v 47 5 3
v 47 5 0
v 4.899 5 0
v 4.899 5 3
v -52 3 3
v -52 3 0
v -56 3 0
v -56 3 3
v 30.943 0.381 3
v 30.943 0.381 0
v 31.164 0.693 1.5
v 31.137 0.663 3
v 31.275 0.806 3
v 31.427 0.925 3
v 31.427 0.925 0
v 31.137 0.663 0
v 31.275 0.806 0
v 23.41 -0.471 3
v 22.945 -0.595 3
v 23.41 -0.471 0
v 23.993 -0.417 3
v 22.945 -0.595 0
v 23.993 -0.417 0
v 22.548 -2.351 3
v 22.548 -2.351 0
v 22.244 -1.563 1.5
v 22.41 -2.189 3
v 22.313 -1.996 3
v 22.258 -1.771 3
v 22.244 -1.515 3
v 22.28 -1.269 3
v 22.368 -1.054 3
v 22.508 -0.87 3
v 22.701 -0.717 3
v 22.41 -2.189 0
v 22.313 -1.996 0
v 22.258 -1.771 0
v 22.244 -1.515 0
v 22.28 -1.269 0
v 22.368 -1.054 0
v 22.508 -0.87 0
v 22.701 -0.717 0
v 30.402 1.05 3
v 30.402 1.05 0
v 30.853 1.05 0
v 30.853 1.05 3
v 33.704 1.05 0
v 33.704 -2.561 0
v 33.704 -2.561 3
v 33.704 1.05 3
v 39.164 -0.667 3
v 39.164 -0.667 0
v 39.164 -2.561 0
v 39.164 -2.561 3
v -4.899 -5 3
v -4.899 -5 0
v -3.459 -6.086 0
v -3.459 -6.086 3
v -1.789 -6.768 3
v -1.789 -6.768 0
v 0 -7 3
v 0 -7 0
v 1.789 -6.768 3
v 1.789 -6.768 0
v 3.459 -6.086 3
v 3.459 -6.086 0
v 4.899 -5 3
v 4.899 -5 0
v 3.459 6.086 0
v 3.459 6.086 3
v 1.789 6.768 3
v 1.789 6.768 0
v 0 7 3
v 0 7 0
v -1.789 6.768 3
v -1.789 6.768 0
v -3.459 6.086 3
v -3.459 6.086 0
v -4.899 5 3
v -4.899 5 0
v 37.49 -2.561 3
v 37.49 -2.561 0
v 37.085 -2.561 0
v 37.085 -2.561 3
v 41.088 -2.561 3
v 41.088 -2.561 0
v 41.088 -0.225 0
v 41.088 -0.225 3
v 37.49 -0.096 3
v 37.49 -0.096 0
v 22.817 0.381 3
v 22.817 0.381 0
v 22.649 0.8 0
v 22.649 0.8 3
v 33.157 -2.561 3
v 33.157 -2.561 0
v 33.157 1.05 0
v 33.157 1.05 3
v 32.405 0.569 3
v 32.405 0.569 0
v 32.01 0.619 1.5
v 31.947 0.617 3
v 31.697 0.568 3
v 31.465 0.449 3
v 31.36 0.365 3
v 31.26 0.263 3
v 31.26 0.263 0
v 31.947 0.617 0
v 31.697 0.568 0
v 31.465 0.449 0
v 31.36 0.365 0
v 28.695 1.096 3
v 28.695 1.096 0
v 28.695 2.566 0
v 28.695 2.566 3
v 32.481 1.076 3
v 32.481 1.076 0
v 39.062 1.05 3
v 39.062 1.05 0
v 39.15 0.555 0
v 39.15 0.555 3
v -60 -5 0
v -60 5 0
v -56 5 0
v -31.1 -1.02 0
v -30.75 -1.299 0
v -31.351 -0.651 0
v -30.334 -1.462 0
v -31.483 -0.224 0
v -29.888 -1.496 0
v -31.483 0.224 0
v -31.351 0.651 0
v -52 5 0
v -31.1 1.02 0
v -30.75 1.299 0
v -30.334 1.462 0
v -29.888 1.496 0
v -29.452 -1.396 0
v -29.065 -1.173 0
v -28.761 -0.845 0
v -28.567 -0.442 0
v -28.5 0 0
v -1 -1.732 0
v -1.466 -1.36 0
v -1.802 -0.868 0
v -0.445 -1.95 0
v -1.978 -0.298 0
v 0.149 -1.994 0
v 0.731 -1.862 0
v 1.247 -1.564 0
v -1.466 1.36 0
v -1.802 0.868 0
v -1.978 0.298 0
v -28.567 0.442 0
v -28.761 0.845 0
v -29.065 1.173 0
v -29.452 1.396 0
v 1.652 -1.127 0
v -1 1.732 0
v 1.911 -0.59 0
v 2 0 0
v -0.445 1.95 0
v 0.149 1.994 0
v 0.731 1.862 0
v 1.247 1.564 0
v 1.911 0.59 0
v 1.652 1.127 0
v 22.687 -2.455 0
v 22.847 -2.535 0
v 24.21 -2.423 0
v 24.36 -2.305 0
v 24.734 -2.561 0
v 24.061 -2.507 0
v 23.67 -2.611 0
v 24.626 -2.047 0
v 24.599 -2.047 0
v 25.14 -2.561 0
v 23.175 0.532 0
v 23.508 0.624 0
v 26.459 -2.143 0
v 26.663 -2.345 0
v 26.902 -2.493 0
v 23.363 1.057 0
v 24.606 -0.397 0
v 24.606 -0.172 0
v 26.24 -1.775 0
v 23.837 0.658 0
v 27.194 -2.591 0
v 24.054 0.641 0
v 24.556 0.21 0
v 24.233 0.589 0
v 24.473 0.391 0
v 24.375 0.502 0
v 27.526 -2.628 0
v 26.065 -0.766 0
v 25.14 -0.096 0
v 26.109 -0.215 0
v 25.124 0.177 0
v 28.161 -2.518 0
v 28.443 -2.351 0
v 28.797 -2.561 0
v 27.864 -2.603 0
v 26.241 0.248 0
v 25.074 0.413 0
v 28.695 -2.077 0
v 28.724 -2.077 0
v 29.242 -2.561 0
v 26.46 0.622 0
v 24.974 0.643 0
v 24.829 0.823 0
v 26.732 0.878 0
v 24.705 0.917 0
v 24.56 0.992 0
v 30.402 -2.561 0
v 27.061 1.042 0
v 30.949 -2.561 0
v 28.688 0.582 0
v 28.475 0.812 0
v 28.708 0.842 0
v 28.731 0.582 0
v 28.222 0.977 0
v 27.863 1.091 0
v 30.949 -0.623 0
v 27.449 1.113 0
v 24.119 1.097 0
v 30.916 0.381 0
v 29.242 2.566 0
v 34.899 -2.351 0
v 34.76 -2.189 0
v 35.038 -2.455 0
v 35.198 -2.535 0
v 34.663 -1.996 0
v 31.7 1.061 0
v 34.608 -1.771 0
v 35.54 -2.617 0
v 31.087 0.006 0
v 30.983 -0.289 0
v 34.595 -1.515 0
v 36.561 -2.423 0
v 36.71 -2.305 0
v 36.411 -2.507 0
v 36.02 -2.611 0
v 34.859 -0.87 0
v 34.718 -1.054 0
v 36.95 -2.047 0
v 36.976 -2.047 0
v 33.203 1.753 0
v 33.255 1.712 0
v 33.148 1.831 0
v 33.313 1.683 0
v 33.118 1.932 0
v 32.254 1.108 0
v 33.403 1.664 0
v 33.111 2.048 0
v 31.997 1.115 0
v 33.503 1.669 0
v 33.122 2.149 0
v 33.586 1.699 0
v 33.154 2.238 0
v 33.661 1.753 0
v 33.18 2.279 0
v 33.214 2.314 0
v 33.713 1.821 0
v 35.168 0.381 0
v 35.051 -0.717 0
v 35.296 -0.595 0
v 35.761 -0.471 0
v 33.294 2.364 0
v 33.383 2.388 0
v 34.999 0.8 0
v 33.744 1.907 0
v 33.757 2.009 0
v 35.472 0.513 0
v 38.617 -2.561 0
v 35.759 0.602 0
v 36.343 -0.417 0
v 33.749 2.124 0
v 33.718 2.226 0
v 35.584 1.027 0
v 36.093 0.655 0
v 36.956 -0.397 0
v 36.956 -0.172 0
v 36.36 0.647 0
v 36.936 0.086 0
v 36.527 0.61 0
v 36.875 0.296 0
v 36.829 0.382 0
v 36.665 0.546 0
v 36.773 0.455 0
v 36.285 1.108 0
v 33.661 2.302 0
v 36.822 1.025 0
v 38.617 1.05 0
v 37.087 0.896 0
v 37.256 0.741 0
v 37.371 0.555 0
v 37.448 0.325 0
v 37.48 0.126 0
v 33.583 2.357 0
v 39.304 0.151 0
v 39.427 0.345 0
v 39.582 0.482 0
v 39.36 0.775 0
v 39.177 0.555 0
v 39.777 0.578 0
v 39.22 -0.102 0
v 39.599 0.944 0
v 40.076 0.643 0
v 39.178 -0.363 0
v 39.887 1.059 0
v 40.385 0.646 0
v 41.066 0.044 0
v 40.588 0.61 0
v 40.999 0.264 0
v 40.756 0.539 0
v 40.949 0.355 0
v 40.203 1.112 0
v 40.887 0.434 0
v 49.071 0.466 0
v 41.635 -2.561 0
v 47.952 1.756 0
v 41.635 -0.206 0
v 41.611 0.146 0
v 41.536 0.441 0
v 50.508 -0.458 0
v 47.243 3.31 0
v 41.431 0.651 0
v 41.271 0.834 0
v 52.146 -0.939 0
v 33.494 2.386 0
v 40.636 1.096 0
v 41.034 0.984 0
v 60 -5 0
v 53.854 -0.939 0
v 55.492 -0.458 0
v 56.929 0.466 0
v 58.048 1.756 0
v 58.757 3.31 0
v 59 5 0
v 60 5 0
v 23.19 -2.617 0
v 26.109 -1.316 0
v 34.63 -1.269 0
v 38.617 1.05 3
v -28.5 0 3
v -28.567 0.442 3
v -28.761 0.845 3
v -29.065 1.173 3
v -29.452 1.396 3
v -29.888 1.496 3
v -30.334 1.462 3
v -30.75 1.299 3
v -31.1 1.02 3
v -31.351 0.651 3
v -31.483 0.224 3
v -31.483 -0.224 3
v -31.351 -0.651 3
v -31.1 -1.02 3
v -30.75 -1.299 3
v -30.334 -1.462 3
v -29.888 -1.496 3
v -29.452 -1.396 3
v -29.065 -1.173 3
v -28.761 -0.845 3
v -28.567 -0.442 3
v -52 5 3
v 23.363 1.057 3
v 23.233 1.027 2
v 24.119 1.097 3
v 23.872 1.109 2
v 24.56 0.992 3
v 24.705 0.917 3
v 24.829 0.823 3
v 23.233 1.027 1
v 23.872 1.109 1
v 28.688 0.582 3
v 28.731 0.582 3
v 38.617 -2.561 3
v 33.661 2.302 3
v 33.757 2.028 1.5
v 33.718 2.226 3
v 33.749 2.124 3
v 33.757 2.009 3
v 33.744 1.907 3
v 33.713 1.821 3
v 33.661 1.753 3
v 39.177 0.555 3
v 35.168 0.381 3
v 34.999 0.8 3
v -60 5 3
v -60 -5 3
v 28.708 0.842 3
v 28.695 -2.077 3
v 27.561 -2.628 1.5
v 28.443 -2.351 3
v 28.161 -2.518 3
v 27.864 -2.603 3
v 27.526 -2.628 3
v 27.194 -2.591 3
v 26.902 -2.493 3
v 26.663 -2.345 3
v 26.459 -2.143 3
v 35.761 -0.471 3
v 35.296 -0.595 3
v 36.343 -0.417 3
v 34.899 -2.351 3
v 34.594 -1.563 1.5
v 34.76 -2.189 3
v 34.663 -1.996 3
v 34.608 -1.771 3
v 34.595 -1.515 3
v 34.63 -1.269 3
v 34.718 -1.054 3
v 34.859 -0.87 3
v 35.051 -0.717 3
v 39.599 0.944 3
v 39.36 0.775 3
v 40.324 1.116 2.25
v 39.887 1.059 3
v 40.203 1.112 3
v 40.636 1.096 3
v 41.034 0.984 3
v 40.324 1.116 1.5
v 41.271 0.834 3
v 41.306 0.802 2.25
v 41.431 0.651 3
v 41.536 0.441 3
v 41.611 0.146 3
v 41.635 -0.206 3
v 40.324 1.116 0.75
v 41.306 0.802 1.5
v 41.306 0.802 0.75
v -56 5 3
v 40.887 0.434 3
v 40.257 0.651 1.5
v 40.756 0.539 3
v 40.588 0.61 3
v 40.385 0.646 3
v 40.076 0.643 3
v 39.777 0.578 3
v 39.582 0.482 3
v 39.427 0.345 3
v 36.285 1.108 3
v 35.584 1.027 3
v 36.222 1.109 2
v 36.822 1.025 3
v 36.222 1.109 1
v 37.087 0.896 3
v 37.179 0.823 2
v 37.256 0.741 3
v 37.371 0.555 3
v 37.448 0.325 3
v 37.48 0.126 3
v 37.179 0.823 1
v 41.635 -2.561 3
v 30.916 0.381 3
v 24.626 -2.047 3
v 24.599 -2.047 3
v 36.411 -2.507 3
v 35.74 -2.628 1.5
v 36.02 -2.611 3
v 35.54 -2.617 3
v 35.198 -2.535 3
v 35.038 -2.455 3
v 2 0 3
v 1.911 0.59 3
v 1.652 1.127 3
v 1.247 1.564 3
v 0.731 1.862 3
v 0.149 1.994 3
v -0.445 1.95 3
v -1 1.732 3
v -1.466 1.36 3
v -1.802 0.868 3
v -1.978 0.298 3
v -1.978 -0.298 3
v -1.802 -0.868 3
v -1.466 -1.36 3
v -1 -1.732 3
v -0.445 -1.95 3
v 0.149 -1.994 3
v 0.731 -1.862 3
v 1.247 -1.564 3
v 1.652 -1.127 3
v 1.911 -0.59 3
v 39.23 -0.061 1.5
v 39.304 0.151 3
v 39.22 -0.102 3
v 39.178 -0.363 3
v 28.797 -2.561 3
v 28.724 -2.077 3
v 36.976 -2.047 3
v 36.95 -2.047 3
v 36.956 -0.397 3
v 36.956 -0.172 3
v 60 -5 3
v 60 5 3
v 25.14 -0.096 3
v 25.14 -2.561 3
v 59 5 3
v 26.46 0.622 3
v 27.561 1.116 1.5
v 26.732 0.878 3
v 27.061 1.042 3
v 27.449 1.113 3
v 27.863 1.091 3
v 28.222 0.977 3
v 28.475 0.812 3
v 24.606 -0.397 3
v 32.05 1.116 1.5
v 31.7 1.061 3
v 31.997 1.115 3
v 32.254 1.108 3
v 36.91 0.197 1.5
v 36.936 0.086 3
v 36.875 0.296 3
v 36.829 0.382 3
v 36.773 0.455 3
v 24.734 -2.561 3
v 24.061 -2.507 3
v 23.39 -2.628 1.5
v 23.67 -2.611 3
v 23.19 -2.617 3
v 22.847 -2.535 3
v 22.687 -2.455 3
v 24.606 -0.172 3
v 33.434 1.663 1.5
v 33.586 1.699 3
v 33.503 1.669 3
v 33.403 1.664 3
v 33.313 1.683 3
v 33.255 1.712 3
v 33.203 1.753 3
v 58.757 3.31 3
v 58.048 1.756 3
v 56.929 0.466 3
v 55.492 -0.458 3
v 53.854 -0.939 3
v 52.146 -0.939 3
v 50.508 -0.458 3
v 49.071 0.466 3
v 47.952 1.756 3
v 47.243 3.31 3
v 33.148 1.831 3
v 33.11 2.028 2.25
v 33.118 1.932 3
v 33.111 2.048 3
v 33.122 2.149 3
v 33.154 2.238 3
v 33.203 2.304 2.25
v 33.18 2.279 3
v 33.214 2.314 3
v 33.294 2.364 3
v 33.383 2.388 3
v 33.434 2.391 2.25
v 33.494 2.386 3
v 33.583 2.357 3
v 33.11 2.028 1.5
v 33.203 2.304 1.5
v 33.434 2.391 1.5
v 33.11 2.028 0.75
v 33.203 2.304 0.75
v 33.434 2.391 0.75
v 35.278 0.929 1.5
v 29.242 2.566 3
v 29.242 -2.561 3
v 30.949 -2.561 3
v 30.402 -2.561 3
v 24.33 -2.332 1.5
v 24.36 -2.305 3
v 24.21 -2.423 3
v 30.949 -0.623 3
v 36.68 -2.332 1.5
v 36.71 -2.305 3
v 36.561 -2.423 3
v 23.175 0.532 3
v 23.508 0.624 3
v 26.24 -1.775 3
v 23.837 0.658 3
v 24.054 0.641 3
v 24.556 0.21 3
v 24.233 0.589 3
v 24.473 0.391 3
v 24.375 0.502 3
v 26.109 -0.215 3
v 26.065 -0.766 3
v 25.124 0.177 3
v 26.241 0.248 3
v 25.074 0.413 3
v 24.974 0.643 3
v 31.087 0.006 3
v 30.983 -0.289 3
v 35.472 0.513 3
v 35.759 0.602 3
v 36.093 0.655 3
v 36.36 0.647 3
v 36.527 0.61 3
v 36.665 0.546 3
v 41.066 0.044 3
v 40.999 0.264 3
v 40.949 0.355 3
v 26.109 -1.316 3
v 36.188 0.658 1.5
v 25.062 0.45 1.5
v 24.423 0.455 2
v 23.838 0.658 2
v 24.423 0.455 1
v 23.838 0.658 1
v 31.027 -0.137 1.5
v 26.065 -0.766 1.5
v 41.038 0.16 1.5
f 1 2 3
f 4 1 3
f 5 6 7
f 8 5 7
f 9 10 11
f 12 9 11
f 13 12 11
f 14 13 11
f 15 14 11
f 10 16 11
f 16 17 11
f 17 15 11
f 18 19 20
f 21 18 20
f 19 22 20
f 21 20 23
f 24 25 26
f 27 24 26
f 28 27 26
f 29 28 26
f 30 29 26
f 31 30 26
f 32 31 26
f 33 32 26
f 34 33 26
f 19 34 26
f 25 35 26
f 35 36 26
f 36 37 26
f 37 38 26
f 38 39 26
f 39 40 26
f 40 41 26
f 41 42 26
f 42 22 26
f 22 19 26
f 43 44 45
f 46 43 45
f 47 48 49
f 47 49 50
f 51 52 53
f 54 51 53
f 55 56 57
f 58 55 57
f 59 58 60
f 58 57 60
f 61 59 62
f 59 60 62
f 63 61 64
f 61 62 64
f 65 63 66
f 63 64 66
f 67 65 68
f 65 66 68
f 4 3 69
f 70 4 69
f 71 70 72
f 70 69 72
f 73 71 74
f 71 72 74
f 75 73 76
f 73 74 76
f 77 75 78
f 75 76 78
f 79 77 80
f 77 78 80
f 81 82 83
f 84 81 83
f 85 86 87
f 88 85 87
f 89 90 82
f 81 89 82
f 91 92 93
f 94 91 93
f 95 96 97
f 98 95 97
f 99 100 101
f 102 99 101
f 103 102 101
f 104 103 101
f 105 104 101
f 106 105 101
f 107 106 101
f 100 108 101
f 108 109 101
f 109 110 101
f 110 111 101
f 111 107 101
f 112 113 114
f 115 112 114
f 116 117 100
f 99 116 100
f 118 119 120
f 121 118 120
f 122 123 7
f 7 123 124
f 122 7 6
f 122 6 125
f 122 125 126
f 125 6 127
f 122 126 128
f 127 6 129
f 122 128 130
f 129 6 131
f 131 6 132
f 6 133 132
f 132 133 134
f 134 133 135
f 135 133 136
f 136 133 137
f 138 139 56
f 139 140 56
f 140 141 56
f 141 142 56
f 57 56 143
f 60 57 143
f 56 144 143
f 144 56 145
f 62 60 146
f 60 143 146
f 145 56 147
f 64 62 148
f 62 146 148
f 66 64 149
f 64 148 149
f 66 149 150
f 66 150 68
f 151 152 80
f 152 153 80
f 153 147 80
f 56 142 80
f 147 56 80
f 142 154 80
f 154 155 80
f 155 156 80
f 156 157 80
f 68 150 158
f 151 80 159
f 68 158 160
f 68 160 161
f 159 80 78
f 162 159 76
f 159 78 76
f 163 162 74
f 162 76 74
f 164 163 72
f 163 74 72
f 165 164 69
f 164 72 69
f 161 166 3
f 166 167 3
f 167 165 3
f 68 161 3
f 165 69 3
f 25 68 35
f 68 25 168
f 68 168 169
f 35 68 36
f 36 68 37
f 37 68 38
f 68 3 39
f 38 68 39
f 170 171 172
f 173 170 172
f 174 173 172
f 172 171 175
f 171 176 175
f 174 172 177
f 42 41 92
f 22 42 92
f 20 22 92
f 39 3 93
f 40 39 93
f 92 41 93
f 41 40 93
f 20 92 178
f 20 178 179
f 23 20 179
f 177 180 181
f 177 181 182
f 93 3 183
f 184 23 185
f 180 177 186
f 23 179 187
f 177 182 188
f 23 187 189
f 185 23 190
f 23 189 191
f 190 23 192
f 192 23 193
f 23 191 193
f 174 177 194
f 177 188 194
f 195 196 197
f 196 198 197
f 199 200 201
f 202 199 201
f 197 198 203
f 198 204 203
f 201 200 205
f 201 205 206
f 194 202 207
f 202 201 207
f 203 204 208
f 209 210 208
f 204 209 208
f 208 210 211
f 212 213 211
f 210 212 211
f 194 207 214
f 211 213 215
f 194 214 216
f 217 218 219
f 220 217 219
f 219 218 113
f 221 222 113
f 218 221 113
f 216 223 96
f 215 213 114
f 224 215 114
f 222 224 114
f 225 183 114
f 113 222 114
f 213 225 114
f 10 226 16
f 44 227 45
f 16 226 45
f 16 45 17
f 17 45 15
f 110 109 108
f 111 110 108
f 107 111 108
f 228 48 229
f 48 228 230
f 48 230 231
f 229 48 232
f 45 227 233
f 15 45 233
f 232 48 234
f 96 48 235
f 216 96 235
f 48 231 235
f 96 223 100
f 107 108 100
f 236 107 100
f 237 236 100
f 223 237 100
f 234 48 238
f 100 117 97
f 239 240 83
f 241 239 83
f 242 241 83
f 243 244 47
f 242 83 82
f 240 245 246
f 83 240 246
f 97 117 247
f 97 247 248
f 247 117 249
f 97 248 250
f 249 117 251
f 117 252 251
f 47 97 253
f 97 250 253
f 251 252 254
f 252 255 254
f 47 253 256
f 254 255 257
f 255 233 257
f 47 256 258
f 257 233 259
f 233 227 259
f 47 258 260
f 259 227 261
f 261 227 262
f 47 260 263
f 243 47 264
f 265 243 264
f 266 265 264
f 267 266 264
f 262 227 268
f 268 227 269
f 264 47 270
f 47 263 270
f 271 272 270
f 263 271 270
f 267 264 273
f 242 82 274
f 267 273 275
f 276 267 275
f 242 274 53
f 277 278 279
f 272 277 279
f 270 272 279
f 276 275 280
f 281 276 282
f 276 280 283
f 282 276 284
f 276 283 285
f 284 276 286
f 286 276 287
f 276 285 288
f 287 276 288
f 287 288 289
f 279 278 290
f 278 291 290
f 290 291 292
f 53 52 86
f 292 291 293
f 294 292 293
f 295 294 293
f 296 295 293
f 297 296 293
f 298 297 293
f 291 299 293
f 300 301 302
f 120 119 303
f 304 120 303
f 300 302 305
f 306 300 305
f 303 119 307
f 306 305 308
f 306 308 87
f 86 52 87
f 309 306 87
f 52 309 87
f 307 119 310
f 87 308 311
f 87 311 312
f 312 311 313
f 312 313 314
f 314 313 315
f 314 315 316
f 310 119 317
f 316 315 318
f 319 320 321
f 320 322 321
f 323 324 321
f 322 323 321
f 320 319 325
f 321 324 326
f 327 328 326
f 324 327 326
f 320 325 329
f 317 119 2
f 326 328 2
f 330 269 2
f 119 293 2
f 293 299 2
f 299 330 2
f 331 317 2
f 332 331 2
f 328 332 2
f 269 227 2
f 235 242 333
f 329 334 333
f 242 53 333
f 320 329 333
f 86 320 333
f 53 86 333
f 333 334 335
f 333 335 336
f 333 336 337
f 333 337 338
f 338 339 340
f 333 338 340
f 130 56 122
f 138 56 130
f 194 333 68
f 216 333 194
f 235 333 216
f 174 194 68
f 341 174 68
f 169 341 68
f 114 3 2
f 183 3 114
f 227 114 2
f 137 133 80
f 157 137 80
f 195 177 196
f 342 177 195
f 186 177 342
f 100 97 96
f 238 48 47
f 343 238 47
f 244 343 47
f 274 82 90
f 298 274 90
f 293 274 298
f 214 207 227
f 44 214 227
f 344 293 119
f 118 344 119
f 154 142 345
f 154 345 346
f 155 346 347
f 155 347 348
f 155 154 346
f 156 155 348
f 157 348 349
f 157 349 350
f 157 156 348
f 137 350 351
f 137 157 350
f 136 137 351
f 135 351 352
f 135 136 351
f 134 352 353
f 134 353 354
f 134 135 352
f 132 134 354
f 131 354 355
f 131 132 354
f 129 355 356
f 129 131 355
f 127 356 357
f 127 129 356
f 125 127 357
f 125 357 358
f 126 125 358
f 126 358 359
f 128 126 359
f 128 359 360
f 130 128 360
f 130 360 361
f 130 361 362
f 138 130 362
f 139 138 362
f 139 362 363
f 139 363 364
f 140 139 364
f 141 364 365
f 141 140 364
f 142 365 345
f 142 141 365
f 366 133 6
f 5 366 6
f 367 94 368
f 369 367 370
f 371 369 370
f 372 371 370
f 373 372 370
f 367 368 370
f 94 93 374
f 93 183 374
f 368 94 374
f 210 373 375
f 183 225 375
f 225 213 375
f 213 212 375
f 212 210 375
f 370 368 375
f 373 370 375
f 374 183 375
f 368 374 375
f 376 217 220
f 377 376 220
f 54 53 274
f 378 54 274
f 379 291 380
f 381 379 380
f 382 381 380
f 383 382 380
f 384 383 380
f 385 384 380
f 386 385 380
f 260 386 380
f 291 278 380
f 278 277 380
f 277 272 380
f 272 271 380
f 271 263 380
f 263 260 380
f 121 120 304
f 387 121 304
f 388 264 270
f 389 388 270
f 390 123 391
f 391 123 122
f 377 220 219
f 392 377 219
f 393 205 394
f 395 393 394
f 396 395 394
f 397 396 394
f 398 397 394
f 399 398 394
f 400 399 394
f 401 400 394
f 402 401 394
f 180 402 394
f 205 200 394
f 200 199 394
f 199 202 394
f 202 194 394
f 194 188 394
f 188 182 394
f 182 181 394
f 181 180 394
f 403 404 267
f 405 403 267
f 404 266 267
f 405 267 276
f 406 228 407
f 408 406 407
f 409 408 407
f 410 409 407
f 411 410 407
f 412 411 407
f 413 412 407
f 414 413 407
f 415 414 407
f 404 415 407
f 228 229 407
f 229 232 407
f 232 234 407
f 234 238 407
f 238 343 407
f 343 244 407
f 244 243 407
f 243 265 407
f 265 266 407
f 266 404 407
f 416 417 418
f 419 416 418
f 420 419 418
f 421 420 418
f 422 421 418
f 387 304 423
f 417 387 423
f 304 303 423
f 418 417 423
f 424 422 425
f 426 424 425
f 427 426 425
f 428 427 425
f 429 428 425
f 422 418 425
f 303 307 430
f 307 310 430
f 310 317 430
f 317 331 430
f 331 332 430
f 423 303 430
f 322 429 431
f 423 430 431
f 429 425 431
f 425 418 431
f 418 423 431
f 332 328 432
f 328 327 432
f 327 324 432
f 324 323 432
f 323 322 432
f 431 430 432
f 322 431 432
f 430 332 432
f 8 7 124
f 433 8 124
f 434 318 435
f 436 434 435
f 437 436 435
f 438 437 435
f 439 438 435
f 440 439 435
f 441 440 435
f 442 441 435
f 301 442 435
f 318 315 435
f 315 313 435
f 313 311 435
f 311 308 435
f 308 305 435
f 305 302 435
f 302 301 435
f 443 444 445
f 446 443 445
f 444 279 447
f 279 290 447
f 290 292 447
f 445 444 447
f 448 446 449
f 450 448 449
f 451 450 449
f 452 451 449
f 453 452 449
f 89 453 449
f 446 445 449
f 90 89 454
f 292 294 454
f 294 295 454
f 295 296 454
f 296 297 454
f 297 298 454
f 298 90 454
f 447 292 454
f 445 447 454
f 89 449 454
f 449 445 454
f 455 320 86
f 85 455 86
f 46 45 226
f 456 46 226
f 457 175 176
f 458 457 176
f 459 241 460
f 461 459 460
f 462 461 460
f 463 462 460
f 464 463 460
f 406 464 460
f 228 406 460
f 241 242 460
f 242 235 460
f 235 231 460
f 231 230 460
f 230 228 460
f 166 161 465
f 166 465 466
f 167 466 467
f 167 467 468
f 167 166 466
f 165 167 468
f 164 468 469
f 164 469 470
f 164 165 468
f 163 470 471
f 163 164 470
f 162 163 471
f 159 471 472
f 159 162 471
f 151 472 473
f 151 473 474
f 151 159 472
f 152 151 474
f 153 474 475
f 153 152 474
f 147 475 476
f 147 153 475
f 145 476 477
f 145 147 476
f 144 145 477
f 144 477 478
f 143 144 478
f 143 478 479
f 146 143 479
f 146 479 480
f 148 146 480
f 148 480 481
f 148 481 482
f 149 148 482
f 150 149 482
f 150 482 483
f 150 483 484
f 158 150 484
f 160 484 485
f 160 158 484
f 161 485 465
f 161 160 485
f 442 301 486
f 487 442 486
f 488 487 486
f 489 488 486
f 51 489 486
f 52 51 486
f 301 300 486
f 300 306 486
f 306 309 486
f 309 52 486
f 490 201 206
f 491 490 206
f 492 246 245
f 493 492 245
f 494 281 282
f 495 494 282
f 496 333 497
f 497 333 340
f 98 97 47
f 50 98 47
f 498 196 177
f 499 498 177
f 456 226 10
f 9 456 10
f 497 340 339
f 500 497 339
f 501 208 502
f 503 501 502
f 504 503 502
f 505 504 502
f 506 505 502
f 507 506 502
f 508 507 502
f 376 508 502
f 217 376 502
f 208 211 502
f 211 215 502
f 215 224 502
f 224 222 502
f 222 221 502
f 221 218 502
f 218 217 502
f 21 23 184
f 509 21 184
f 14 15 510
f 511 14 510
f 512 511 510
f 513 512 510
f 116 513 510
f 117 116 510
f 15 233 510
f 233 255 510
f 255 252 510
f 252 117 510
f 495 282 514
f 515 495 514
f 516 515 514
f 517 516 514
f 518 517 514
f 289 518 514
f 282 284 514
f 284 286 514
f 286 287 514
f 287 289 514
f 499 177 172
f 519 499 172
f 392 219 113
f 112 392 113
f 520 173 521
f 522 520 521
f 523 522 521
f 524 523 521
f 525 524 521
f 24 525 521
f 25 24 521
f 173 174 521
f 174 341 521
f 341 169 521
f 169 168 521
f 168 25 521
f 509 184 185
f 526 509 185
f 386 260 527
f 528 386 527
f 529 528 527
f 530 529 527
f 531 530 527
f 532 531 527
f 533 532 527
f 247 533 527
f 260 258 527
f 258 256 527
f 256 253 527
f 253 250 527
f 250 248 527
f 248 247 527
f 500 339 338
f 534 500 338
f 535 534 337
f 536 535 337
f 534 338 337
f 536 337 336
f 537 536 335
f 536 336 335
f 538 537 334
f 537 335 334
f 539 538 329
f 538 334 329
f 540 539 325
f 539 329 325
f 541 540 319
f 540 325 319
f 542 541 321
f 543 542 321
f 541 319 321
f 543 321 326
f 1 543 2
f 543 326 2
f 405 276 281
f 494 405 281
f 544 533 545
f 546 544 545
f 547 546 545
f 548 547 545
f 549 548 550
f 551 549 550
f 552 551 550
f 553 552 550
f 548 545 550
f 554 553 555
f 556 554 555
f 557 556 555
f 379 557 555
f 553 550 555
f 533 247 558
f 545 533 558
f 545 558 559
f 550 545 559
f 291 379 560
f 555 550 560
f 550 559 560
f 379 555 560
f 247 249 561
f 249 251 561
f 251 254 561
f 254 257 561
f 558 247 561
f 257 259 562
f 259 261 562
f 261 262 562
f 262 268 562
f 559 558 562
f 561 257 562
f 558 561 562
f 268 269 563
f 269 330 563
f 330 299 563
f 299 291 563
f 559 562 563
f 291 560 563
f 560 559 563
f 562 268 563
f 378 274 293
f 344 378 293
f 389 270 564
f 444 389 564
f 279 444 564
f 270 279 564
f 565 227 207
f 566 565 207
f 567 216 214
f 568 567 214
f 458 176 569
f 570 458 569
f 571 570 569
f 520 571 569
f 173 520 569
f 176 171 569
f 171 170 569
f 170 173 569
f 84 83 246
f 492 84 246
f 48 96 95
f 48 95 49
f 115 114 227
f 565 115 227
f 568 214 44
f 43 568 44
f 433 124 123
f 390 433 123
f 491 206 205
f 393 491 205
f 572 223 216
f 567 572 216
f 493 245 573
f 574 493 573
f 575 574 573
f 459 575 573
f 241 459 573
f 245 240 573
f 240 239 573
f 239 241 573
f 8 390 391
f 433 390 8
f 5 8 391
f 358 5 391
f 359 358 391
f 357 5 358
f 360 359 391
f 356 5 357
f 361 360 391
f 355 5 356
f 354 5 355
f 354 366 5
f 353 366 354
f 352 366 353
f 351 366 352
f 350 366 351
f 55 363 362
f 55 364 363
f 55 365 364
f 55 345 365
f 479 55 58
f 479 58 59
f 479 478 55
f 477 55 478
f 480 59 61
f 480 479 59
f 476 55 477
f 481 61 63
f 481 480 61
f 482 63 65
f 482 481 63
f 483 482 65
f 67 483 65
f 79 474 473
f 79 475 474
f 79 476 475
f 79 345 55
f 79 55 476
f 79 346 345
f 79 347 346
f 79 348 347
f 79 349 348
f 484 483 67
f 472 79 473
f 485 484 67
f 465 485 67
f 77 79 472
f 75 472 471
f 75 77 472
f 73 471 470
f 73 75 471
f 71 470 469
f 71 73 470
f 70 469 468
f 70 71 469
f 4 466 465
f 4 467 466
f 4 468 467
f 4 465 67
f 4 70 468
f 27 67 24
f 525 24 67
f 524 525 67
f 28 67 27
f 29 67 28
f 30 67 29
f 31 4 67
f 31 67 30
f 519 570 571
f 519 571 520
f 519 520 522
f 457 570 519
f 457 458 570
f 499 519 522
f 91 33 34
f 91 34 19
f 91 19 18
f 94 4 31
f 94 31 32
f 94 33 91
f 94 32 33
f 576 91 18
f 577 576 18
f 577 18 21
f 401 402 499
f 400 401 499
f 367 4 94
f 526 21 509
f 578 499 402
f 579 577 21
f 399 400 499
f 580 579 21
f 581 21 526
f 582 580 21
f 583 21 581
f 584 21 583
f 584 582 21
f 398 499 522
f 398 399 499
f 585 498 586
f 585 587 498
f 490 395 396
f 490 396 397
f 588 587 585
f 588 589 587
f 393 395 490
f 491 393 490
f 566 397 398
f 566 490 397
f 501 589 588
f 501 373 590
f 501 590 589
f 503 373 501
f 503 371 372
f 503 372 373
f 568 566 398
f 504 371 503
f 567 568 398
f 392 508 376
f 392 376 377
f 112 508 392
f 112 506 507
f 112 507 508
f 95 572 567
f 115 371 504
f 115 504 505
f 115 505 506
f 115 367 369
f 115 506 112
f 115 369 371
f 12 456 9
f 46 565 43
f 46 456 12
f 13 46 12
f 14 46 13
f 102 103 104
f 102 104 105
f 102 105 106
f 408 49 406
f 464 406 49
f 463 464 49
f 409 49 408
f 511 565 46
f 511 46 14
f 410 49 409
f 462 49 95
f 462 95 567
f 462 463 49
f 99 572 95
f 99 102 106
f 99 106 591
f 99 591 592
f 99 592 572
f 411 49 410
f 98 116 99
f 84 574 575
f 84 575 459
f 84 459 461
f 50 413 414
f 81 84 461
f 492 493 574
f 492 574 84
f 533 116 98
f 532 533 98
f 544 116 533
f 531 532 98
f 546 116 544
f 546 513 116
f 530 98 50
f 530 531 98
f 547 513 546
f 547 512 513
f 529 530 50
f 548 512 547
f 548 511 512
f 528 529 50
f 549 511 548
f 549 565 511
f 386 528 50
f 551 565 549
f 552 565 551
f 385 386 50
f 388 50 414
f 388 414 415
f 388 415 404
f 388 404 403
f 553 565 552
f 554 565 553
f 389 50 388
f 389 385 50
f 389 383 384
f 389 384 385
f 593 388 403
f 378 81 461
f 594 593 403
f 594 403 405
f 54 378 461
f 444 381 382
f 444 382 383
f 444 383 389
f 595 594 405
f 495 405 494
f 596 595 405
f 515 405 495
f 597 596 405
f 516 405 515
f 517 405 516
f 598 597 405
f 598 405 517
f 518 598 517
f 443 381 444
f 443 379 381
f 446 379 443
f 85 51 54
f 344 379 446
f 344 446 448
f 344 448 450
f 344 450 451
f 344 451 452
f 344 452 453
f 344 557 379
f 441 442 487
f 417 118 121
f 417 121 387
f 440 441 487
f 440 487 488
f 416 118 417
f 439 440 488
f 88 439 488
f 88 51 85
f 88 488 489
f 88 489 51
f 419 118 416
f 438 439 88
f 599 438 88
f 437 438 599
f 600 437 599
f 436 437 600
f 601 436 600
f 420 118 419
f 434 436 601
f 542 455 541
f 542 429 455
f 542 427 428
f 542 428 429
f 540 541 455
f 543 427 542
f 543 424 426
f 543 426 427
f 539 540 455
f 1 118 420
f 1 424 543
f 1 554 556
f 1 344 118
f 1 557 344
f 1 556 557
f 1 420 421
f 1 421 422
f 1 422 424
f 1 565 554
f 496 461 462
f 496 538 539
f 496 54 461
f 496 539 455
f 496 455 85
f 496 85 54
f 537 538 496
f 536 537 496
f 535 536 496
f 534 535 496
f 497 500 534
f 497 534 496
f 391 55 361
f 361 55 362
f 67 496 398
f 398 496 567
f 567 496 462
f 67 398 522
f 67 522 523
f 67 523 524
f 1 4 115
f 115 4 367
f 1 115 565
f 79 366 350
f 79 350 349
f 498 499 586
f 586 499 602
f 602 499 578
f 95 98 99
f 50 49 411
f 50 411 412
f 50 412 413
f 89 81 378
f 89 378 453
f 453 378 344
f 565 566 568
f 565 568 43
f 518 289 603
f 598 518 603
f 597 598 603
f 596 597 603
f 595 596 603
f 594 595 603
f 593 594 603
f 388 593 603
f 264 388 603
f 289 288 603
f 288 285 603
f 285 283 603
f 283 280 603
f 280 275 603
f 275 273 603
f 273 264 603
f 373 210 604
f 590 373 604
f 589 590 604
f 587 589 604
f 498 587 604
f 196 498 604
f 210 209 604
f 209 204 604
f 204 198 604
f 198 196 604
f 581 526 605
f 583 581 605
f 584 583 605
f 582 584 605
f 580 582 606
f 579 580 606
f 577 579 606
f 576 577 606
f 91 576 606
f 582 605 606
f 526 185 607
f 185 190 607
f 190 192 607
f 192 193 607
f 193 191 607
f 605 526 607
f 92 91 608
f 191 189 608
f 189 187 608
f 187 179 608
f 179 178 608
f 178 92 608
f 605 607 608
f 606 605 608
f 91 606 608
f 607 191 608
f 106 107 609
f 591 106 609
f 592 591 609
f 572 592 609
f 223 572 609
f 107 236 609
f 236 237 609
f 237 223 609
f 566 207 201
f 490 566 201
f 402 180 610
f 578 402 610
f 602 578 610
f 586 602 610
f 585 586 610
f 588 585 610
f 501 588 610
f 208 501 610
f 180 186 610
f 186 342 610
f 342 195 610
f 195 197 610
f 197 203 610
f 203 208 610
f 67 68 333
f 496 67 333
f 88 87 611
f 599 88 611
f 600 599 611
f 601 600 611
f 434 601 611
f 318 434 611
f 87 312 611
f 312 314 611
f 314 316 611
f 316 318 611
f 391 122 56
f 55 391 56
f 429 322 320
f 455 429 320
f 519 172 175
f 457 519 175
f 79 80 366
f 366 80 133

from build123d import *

# Parameters (mm, degrees)
F0_R     = 1.5
F0_R_2   = 2
F0_W     = 0.5472422647
F0_H     = 3.6113771804
F1_DEPTH = 3


with BuildPart() as f1:
    # F0 (on Top) → F1 (new body)
    with BuildSketch(Plane.XY):
        with BuildLine():
            Line((-60, 5), (-60, -5))
            Line((-60, -5), (-4.8989794856, -5))
            ThreePointArc((-4.8989794856, -5), (-7, 0), (-4.8989794856, 5))
            Line((-4.8989794856, 5), (-52, 5))
            Line((-52, 5), (-52, 3))
            Line((-52, 3), (-56, 3))
            Line((-56, 3), (-56, 5))
            Line((-56, 5), (-60, 5))
        make_face()
        with Locations((-30, 0)):
            Circle(F0_R, mode=Mode.SUBTRACT)
        with BuildLine():
            ThreePointArc((-4.8989794856, 5), (-7, 0), (-4.8989794856, -5))
            Line((-4.8989794856, -5), (4.8989794856, -5))
            ThreePointArc((4.8989794856, -5), (6.4534043883, -2.7117470016), (7, 0))
            ThreePointArc((7, 0), (6.4534043883, 2.7117470016), (4.8989794856, 5))
            Line((4.8989794856, 5), (-4.8989794856, 5))
        make_face()
        Circle(F0_R_2, mode=Mode.SUBTRACT)
        with BuildLine():
            ThreePointArc((4.8989794856, 5), (0, 7), (-4.8989794856, 5))
            Line((-4.8989794856, 5), (4.8989794856, 5))
        make_face()
        with BuildLine():
            Line((4.8989794856, -5), (-4.8989794856, -5))
            ThreePointArc((-4.8989794856, -5), (0, -7), (4.8989794856, -5))
        make_face()
        with BuildLine():
            ThreePointArc((7, 0), (6.4534043883, -2.7117470016), (4.8989794856, -5))
            Line((4.8989794856, -5), (60, -5))
            Line((60, -5), (60, 5))
            Line((60, 5), (59, 5))
            ThreePointArc((59, 5), (53, -1), (47, 5))
            Line((47, 5), (4.8989794856, 5))
            ThreePointArc((4.8989794856, 5), (6.4534043883, 2.7117470016), (7, 0))
        make_face()
        with BuildLine():
            Line((25.1401150036, -2.5613930775), (24.734164576, -2.5613930775))
            Line((24.734164576, -2.5613930775), (24.6255596564, -2.0468377303))
            Line((24.6255596564, -2.0468377303), (24.5991992391, -2.0468377303))
            add(Edge.make_bspline(
                [(24.5991992391, -2.0468377303), (24.3292685651, -2.3863599061), (24.0609195163, -2.5070906177)],
                knots=[0, 0, 0, 1, 1, 1], degree=2))
            add(Edge.make_bspline(
                [(24.0609195163, -2.5070906177), (23.7925704674, -2.6278213293), (23.3897832899, -2.6278213293)],
                knots=[0, 0, 0, 1, 1, 1], degree=2))
            add(Edge.make_bspline(
                [(23.3897832899, -2.6278213293), (22.8530851922, -2.6278213293), (22.5483587673, -2.3505097385)],
                knots=[0, 0, 0, 1, 1, 1], degree=2))
            add(Edge.make_bspline(
                [(22.5483587673, -2.3505097385), (22.2436323425, -2.0731981477), (22.2436323425, -1.5628604673)],
                knots=[0, 0, 0, 1, 1, 1], degree=2))
            add(Edge.make_bspline(
                [(22.2436323425, -1.5628604673), (22.2436323425, -0.4694303546), (23.9929096394, -0.4167095199)],
                knots=[0, 0, 0, 1, 1, 1], degree=2))
            Line((23.9929096394, -0.4167095199), (24.6055257392, -0.3966756027))
            Line((24.6055257392, -0.3966756027), (24.6055257392, -0.1720848466))
            add(Edge.make_bspline(
                [(24.6055257392, -0.1720848466), (24.6055257392, 0.2528450815), (24.423111651, 0.4552930869)],
                knots=[0, 0, 0, 1, 1, 1], degree=2))
            add(Edge.make_bspline(
                [(24.423111651, 0.4552930869), (24.2406975628, 0.6577410923), (23.8379103853, 0.6577410923)],
                knots=[0, 0, 0, 1, 1, 1], degree=2))
            add(Edge.make_bspline(
                [(23.8379103853, 0.6577410923), (23.3866200398, 0.6577410923), (22.8172350245, 0.3814839182)],
                knots=[0, 0, 0, 1, 1, 1], degree=2))
            Line((22.8172350245, 0.3814839182), (22.6485283533, 0.8000873462))
            add(Edge.make_bspline(
                [(22.6485283533, 0.8000873462), (22.9152957772, 0.9445424334), (23.2332024107, 1.0267869356)],
                knots=[0, 0, 0, 1, 1, 1], degree=2))
            add(Edge.make_bspline(
                [(23.2332024107, 1.0267869356), (23.5511090442, 1.1090314378), (23.8716517195, 1.1090314378)],
                knots=[0, 0, 0, 1, 1, 1], degree=2))
            add(Edge.make_bspline(
                [(23.8716517195, 1.1090314378), (24.5169547369, 1.1090314378), (24.8285348702, 0.8227573051)],
                knots=[0, 0, 0, 1, 1, 1], degree=2))
            add(Edge.make_bspline(
                [(24.8285348702, 0.8227573051), (25.1401150036, 0.5364831724), (25.1401150036, -0.0961668446)],
                knots=[0, 0, 0, 1, 1, 1], degree=2))
            Line((25.1401150036, -0.0961668446), (25.1401150036, -2.5613930775))
        make_face(mode=Mode.SUBTRACT)
        with BuildLine():
            Line((28.7968321018, -2.5613930775), (28.7240773499, -2.0774158145))
            Line((28.7240773499, -2.0774158145), (28.6945536824, -2.0774158145))
            add(Edge.make_bspline(
                [(28.6945536824, -2.0774158145), (28.3160180889, -2.6278213293), (27.5610557353, -2.6278213293)],
                knots=[0, 0, 0, 1, 1, 1], degree=2))
            add(Edge.make_bspline(
                [(27.5610557353, -2.6278213293), (26.8524877163, -2.6278213293), (26.4586630807, -2.1433168579)],
                knots=[0, 0, 0, 1, 1, 1], degree=2))
            add(Edge.make_bspline(
                [(26.4586630807, -2.1433168579), (26.0648384451, -1.6588123866), (26.0648384451, -0.7657214459)],
                knots=[0, 0, 0, 1, 1, 1], degree=2))
            add(Edge.make_bspline(
                [(26.0648384451, -0.7657214459), (26.0648384451, 0.1273694947), (26.4602447057, 0.6218909247)],
                knots=[0, 0, 0, 1, 1, 1], degree=2))
            add(Edge.make_bspline(
                [(26.4602447057, 0.6218909247), (26.8556509664, 1.1164123547), (27.5610557353, 1.1164123547)],
                knots=[0, 0, 0, 1, 1, 1], degree=2))
            add(Edge.make_bspline(
                [(27.5610557353, 1.1164123547), (28.2959841717, 1.1164123547), (28.6882271823, 0.5818230903)],
                knots=[0, 0, 0, 1, 1, 1], degree=2))
            Line((28.6882271823, 0.5818230903), (28.7314582667, 0.5818230903))
            Line((28.7314582667, 0.5818230903), (28.7082610995, 0.842264014))
            Line((28.7082610995, 0.842264014), (28.6945536824, 1.0963784374))
            Line((28.6945536824, 1.0963784374), (28.6945536824, 2.5662353103))
            Line((28.6945536824, 2.5662353103), (29.2417959471, 2.5662353103))
            Line((29.2417959471, 2.5662353103), (29.2417959471, -2.5613930775))
            Line((29.2417959471, -2.5613930775), (28.7968321018, -2.5613930775))
        make_face(mode=Mode.SUBTRACT)
        with BuildLine():
            add(Edge.make_bspline(
                [(31.4265473392, 0.9250357245), (31.7101854301, 1.1164123547), (32.0497076059, 1.1164123547)],
                knots=[0, 0, 0, 1, 1, 1], degree=2))
            add(Edge.make_bspline(
                [(32.0497076059, 1.1164123547), (32.2901146124, 1.1164123547), (32.4809640341, 1.0763445202)],
                knots=[0, 0, 0, 1, 1, 1], degree=2))
            Line((32.4809640341, 1.0763445202), (32.4050460321, 0.56917009))
            add(Edge.make_bspline(
                [(32.4050460321, 0.56917009), (32.1815096928, 0.6187276746), (32.0096397715, 0.6187276746)],
                knots=[0, 0, 0, 1, 1, 1], degree=2))
            add(Edge.make_bspline(
                [(32.0096397715, 0.6187276746), (31.5710024264, 0.6187276746), (31.2599495013, 0.2628620401)],
                knots=[0, 0, 0, 1, 1, 1], degree=2))
            add(Edge.make_bspline(
                [(31.2599495013, 0.2628620401), (30.9488965763, -0.0930035945), (30.9488965763, -0.6233751921)],
                knots=[0, 0, 0, 1, 1, 1], degree=2))
            Line((30.9488965763, -0.6233751921), (30.9488965763, -2.5613930775))
            Line((30.9488965763, -2.5613930775), (30.4016543116, -2.5613930775))
            Line((30.4016543116, -2.5613930775), (30.4016543116, 1.0499841029))
            Line((30.4016543116, 1.0499841029), (30.8529446571, 1.0499841029))
            Line((30.8529446571, 1.0499841029), (30.9162096588, 0.3814839182))
            Line((30.9162096588, 0.3814839182), (30.9425700761, 0.3814839182))
            add(Edge.make_bspline(
                [(30.9425700761, 0.3814839182), (31.1429092482, 0.7336590944), (31.4265473392, 0.9250357245)],
                knots=[0, 0, 0, 1, 1, 1], degree=2))
        make_face(mode=Mode.SUBTRACT)
        with Locations((33.430466268, -0.7557044873)):
            Rectangle(F0_W, F0_H, mode=Mode.SUBTRACT)
        with BuildLine():
            Line((37.4904977521, -2.5613930775), (37.0845473245, -2.5613930775))
            Line((37.0845473245, -2.5613930775), (36.9759424049, -2.0468377303))
            Line((36.9759424049, -2.0468377303), (36.9495819875, -2.0468377303))
            add(Edge.make_bspline(
                [(36.9495819875, -2.0468377303), (36.6796513136, -2.3863599061), (36.4113022647, -2.5070906177)],
                knots=[0, 0, 0, 1, 1, 1], degree=2))
            add(Edge.make_bspline(
                [(36.4113022647, -2.5070906177), (36.1429532159, -2.6278213293), (35.7401660384, -2.6278213293)],
                knots=[0, 0, 0, 1, 1, 1], degree=2))
            add(Edge.make_bspline(
                [(35.7401660384, -2.6278213293), (35.2034679406, -2.6278213293), (34.8987415158, -2.3505097385)],
                knots=[0, 0, 0, 1, 1, 1], degree=2))
            add(Edge.make_bspline(
                [(34.8987415158, -2.3505097385), (34.5940150909, -2.0731981477), (34.5940150909, -1.5628604673)],
                knots=[0, 0, 0, 1, 1, 1], degree=2))
            add(Edge.make_bspline(
                [(34.5940150909, -1.5628604673), (34.5940150909, -0.4694303546), (36.3432923879, -0.4167095199)],
                knots=[0, 0, 0, 1, 1, 1], degree=2))
            Line((36.3432923879, -0.4167095199), (36.9559084877, -0.3966756027))
            Line((36.9559084877, -0.3966756027), (36.9559084877, -0.1720848466))
            add(Edge.make_bspline(
                [(36.9559084877, -0.1720848466), (36.9559084877, 0.2528450815), (36.7734943995, 0.4552930869)],
                knots=[0, 0, 0, 1, 1, 1], degree=2))
            add(Edge.make_bspline(
                [(36.7734943995, 0.4552930869), (36.5910803112, 0.6577410923), (36.1882931337, 0.6577410923)],
                knots=[0, 0, 0, 1, 1, 1], degree=2))
            add(Edge.make_bspline(
                [(36.1882931337, 0.6577410923), (35.7370027883, 0.6577410923), (35.167617773, 0.3814839182)],
                knots=[0, 0, 0, 1, 1, 1], degree=2))
            Line((35.167617773, 0.3814839182), (34.9989111018, 0.8000873462))
            add(Edge.make_bspline(
                [(34.9989111018, 0.8000873462), (35.2656785256, 0.9445424334), (35.5835851592, 1.0267869356)],
                knots=[0, 0, 0, 1, 1, 1], degree=2))
            add(Edge.make_bspline(
                [(35.5835851592, 1.0267869356), (35.9014917927, 1.1090314378), (36.222034468, 1.1090314378)],
                knots=[0, 0, 0, 1, 1, 1], degree=2))
            add(Edge.make_bspline(
                [(36.222034468, 1.1090314378), (36.8673374853, 1.1090314378), (37.1789176187, 0.8227573051)],
                knots=[0, 0, 0, 1, 1, 1], degree=2))
            add(Edge.make_bspline(
                [(37.1789176187, 0.8227573051), (37.4904977521, 0.5364831724), (37.4904977521, -0.0961668446)],
                knots=[0, 0, 0, 1, 1, 1], degree=2))
            Line((37.4904977521, -0.0961668446), (37.4904977521, -2.5613930775))
        make_face(mode=Mode.SUBTRACT)
        with BuildLine():
            Line((41.6354097801, -2.5613930775), (41.0881675154, -2.5613930775))
            Line((41.0881675154, -2.5613930775), (41.0881675154, -0.2248056814))
            add(Edge.make_bspline(
                [(41.0881675154, -0.2248056814), (41.0881675154, 0.2159404971), (40.887301135, 0.4336775446)],
                knots=[0, 0, 0, 1, 1, 1], degree=2))
            add(Edge.make_bspline(
                [(40.887301135, 0.4336775446), (40.6864347546, 0.6514145922), (40.2572871597, 0.6514145922)],
                knots=[0, 0, 0, 1, 1, 1], degree=2))
            add(Edge.make_bspline(
                [(40.2572871597, 0.6514145922), (39.6910653945, 0.6514145922), (39.4274612208, 0.3451065423)],
                knots=[0, 0, 0, 1, 1, 1], degree=2))
            add(Edge.make_bspline(
                [(39.4274612208, 0.3451065423), (39.163857047, 0.0387984924), (39.163857047, -0.6666062766)],
                knots=[0, 0, 0, 1, 1, 1], degree=2))
            Line((39.163857047, -0.6666062766), (39.163857047, -2.5613930775))
            Line((39.163857047, -2.5613930775), (38.6166147823, -2.5613930775))
            Line((38.6166147823, -2.5613930775), (38.6166147823, 1.0499841029))
            Line((38.6166147823, 1.0499841029), (39.0615786276, 1.0499841029))
            Line((39.0615786276, 1.0499841029), (39.15014963, 0.5554626729))
            Line((39.15014963, 0.5554626729), (39.1765100474, 0.5554626729))
            add(Edge.make_bspline(
                [(39.1765100474, 0.5554626729), (39.3452167186, 0.8222300967), (39.6483615184, 0.9693212257)],
                knots=[0, 0, 0, 1, 1, 1], degree=2))
            add(Edge.make_bspline(
                [(39.6483615184, 0.9693212257), (39.9515063182, 1.1164123547), (40.3237154115, 1.1164123547)],
                knots=[0, 0, 0, 1, 1, 1], degree=2))
            add(Edge.make_bspline(
                [(40.3237154115, 1.1164123547), (40.9763993457, 1.1164123547), (41.3059045629, 0.8016689712)],
                knots=[0, 0, 0, 1, 1, 1], degree=2))
            add(Edge.make_bspline(
                [(41.3059045629, 0.8016689712), (41.6354097801, 0.4869255877), (41.6354097801, -0.2058261809)],
                knots=[0, 0, 0, 1, 1, 1], degree=2))
            Line((41.6354097801, -0.2058261809), (41.6354097801, -2.5613930775))
        make_face(mode=Mode.SUBTRACT)
        with BuildLine():
            add(Edge.make_bspline(
                [(33.2027122619, 1.7532800384), (33.1104508011, 1.8439598742), (33.1104508011, 2.0284827958)],
                knots=[0, 0, 0, 1, 1, 1], degree=2))
            add(Edge.make_bspline(
                [(33.1104508011, 2.0284827958), (33.1104508011, 2.2161689675), (33.2027122619, 2.3036855532)],
                knots=[0, 0, 0, 1, 1, 1], degree=2))
            add(Edge.make_bspline(
                [(33.2027122619, 2.3036855532), (33.2949737227, 2.3912021389), (33.4341567264, 2.3912021389)],
                knots=[0, 0, 0, 1, 1, 1], degree=2))
            add(Edge.make_bspline(
                [(33.4341567264, 2.3912021389), (33.5659588133, 2.3912021389), (33.6613835242, 2.3021039282)],
                knots=[0, 0, 0, 1, 1, 1], degree=2))
            add(Edge.make_bspline(
                [(33.6613835242, 2.3021039282), (33.7568082351, 2.2130057174), (33.7568082351, 2.0284827958)],
                knots=[0, 0, 0, 1, 1, 1], degree=2))
            add(Edge.make_bspline(
                [(33.7568082351, 2.0284827958), (33.7568082351, 1.8439598742), (33.6613835242, 1.7532800384)],
                knots=[0, 0, 0, 1, 1, 1], degree=2))
            add(Edge.make_bspline(
                [(33.6613835242, 1.7532800384), (33.5659588133, 1.6626002027), (33.4341567264, 1.6626002027)],
                knots=[0, 0, 0, 1, 1, 1], degree=2))
            add(Edge.make_bspline(
                [(33.4341567264, 1.6626002027), (33.2949737227, 1.6626002027), (33.2027122619, 1.7532800384)],
                knots=[0, 0, 0, 1, 1, 1], degree=2))
        make_face(mode=Mode.SUBTRACT)
    extrude(amount=F1_DEPTH)


solid = f1.part
